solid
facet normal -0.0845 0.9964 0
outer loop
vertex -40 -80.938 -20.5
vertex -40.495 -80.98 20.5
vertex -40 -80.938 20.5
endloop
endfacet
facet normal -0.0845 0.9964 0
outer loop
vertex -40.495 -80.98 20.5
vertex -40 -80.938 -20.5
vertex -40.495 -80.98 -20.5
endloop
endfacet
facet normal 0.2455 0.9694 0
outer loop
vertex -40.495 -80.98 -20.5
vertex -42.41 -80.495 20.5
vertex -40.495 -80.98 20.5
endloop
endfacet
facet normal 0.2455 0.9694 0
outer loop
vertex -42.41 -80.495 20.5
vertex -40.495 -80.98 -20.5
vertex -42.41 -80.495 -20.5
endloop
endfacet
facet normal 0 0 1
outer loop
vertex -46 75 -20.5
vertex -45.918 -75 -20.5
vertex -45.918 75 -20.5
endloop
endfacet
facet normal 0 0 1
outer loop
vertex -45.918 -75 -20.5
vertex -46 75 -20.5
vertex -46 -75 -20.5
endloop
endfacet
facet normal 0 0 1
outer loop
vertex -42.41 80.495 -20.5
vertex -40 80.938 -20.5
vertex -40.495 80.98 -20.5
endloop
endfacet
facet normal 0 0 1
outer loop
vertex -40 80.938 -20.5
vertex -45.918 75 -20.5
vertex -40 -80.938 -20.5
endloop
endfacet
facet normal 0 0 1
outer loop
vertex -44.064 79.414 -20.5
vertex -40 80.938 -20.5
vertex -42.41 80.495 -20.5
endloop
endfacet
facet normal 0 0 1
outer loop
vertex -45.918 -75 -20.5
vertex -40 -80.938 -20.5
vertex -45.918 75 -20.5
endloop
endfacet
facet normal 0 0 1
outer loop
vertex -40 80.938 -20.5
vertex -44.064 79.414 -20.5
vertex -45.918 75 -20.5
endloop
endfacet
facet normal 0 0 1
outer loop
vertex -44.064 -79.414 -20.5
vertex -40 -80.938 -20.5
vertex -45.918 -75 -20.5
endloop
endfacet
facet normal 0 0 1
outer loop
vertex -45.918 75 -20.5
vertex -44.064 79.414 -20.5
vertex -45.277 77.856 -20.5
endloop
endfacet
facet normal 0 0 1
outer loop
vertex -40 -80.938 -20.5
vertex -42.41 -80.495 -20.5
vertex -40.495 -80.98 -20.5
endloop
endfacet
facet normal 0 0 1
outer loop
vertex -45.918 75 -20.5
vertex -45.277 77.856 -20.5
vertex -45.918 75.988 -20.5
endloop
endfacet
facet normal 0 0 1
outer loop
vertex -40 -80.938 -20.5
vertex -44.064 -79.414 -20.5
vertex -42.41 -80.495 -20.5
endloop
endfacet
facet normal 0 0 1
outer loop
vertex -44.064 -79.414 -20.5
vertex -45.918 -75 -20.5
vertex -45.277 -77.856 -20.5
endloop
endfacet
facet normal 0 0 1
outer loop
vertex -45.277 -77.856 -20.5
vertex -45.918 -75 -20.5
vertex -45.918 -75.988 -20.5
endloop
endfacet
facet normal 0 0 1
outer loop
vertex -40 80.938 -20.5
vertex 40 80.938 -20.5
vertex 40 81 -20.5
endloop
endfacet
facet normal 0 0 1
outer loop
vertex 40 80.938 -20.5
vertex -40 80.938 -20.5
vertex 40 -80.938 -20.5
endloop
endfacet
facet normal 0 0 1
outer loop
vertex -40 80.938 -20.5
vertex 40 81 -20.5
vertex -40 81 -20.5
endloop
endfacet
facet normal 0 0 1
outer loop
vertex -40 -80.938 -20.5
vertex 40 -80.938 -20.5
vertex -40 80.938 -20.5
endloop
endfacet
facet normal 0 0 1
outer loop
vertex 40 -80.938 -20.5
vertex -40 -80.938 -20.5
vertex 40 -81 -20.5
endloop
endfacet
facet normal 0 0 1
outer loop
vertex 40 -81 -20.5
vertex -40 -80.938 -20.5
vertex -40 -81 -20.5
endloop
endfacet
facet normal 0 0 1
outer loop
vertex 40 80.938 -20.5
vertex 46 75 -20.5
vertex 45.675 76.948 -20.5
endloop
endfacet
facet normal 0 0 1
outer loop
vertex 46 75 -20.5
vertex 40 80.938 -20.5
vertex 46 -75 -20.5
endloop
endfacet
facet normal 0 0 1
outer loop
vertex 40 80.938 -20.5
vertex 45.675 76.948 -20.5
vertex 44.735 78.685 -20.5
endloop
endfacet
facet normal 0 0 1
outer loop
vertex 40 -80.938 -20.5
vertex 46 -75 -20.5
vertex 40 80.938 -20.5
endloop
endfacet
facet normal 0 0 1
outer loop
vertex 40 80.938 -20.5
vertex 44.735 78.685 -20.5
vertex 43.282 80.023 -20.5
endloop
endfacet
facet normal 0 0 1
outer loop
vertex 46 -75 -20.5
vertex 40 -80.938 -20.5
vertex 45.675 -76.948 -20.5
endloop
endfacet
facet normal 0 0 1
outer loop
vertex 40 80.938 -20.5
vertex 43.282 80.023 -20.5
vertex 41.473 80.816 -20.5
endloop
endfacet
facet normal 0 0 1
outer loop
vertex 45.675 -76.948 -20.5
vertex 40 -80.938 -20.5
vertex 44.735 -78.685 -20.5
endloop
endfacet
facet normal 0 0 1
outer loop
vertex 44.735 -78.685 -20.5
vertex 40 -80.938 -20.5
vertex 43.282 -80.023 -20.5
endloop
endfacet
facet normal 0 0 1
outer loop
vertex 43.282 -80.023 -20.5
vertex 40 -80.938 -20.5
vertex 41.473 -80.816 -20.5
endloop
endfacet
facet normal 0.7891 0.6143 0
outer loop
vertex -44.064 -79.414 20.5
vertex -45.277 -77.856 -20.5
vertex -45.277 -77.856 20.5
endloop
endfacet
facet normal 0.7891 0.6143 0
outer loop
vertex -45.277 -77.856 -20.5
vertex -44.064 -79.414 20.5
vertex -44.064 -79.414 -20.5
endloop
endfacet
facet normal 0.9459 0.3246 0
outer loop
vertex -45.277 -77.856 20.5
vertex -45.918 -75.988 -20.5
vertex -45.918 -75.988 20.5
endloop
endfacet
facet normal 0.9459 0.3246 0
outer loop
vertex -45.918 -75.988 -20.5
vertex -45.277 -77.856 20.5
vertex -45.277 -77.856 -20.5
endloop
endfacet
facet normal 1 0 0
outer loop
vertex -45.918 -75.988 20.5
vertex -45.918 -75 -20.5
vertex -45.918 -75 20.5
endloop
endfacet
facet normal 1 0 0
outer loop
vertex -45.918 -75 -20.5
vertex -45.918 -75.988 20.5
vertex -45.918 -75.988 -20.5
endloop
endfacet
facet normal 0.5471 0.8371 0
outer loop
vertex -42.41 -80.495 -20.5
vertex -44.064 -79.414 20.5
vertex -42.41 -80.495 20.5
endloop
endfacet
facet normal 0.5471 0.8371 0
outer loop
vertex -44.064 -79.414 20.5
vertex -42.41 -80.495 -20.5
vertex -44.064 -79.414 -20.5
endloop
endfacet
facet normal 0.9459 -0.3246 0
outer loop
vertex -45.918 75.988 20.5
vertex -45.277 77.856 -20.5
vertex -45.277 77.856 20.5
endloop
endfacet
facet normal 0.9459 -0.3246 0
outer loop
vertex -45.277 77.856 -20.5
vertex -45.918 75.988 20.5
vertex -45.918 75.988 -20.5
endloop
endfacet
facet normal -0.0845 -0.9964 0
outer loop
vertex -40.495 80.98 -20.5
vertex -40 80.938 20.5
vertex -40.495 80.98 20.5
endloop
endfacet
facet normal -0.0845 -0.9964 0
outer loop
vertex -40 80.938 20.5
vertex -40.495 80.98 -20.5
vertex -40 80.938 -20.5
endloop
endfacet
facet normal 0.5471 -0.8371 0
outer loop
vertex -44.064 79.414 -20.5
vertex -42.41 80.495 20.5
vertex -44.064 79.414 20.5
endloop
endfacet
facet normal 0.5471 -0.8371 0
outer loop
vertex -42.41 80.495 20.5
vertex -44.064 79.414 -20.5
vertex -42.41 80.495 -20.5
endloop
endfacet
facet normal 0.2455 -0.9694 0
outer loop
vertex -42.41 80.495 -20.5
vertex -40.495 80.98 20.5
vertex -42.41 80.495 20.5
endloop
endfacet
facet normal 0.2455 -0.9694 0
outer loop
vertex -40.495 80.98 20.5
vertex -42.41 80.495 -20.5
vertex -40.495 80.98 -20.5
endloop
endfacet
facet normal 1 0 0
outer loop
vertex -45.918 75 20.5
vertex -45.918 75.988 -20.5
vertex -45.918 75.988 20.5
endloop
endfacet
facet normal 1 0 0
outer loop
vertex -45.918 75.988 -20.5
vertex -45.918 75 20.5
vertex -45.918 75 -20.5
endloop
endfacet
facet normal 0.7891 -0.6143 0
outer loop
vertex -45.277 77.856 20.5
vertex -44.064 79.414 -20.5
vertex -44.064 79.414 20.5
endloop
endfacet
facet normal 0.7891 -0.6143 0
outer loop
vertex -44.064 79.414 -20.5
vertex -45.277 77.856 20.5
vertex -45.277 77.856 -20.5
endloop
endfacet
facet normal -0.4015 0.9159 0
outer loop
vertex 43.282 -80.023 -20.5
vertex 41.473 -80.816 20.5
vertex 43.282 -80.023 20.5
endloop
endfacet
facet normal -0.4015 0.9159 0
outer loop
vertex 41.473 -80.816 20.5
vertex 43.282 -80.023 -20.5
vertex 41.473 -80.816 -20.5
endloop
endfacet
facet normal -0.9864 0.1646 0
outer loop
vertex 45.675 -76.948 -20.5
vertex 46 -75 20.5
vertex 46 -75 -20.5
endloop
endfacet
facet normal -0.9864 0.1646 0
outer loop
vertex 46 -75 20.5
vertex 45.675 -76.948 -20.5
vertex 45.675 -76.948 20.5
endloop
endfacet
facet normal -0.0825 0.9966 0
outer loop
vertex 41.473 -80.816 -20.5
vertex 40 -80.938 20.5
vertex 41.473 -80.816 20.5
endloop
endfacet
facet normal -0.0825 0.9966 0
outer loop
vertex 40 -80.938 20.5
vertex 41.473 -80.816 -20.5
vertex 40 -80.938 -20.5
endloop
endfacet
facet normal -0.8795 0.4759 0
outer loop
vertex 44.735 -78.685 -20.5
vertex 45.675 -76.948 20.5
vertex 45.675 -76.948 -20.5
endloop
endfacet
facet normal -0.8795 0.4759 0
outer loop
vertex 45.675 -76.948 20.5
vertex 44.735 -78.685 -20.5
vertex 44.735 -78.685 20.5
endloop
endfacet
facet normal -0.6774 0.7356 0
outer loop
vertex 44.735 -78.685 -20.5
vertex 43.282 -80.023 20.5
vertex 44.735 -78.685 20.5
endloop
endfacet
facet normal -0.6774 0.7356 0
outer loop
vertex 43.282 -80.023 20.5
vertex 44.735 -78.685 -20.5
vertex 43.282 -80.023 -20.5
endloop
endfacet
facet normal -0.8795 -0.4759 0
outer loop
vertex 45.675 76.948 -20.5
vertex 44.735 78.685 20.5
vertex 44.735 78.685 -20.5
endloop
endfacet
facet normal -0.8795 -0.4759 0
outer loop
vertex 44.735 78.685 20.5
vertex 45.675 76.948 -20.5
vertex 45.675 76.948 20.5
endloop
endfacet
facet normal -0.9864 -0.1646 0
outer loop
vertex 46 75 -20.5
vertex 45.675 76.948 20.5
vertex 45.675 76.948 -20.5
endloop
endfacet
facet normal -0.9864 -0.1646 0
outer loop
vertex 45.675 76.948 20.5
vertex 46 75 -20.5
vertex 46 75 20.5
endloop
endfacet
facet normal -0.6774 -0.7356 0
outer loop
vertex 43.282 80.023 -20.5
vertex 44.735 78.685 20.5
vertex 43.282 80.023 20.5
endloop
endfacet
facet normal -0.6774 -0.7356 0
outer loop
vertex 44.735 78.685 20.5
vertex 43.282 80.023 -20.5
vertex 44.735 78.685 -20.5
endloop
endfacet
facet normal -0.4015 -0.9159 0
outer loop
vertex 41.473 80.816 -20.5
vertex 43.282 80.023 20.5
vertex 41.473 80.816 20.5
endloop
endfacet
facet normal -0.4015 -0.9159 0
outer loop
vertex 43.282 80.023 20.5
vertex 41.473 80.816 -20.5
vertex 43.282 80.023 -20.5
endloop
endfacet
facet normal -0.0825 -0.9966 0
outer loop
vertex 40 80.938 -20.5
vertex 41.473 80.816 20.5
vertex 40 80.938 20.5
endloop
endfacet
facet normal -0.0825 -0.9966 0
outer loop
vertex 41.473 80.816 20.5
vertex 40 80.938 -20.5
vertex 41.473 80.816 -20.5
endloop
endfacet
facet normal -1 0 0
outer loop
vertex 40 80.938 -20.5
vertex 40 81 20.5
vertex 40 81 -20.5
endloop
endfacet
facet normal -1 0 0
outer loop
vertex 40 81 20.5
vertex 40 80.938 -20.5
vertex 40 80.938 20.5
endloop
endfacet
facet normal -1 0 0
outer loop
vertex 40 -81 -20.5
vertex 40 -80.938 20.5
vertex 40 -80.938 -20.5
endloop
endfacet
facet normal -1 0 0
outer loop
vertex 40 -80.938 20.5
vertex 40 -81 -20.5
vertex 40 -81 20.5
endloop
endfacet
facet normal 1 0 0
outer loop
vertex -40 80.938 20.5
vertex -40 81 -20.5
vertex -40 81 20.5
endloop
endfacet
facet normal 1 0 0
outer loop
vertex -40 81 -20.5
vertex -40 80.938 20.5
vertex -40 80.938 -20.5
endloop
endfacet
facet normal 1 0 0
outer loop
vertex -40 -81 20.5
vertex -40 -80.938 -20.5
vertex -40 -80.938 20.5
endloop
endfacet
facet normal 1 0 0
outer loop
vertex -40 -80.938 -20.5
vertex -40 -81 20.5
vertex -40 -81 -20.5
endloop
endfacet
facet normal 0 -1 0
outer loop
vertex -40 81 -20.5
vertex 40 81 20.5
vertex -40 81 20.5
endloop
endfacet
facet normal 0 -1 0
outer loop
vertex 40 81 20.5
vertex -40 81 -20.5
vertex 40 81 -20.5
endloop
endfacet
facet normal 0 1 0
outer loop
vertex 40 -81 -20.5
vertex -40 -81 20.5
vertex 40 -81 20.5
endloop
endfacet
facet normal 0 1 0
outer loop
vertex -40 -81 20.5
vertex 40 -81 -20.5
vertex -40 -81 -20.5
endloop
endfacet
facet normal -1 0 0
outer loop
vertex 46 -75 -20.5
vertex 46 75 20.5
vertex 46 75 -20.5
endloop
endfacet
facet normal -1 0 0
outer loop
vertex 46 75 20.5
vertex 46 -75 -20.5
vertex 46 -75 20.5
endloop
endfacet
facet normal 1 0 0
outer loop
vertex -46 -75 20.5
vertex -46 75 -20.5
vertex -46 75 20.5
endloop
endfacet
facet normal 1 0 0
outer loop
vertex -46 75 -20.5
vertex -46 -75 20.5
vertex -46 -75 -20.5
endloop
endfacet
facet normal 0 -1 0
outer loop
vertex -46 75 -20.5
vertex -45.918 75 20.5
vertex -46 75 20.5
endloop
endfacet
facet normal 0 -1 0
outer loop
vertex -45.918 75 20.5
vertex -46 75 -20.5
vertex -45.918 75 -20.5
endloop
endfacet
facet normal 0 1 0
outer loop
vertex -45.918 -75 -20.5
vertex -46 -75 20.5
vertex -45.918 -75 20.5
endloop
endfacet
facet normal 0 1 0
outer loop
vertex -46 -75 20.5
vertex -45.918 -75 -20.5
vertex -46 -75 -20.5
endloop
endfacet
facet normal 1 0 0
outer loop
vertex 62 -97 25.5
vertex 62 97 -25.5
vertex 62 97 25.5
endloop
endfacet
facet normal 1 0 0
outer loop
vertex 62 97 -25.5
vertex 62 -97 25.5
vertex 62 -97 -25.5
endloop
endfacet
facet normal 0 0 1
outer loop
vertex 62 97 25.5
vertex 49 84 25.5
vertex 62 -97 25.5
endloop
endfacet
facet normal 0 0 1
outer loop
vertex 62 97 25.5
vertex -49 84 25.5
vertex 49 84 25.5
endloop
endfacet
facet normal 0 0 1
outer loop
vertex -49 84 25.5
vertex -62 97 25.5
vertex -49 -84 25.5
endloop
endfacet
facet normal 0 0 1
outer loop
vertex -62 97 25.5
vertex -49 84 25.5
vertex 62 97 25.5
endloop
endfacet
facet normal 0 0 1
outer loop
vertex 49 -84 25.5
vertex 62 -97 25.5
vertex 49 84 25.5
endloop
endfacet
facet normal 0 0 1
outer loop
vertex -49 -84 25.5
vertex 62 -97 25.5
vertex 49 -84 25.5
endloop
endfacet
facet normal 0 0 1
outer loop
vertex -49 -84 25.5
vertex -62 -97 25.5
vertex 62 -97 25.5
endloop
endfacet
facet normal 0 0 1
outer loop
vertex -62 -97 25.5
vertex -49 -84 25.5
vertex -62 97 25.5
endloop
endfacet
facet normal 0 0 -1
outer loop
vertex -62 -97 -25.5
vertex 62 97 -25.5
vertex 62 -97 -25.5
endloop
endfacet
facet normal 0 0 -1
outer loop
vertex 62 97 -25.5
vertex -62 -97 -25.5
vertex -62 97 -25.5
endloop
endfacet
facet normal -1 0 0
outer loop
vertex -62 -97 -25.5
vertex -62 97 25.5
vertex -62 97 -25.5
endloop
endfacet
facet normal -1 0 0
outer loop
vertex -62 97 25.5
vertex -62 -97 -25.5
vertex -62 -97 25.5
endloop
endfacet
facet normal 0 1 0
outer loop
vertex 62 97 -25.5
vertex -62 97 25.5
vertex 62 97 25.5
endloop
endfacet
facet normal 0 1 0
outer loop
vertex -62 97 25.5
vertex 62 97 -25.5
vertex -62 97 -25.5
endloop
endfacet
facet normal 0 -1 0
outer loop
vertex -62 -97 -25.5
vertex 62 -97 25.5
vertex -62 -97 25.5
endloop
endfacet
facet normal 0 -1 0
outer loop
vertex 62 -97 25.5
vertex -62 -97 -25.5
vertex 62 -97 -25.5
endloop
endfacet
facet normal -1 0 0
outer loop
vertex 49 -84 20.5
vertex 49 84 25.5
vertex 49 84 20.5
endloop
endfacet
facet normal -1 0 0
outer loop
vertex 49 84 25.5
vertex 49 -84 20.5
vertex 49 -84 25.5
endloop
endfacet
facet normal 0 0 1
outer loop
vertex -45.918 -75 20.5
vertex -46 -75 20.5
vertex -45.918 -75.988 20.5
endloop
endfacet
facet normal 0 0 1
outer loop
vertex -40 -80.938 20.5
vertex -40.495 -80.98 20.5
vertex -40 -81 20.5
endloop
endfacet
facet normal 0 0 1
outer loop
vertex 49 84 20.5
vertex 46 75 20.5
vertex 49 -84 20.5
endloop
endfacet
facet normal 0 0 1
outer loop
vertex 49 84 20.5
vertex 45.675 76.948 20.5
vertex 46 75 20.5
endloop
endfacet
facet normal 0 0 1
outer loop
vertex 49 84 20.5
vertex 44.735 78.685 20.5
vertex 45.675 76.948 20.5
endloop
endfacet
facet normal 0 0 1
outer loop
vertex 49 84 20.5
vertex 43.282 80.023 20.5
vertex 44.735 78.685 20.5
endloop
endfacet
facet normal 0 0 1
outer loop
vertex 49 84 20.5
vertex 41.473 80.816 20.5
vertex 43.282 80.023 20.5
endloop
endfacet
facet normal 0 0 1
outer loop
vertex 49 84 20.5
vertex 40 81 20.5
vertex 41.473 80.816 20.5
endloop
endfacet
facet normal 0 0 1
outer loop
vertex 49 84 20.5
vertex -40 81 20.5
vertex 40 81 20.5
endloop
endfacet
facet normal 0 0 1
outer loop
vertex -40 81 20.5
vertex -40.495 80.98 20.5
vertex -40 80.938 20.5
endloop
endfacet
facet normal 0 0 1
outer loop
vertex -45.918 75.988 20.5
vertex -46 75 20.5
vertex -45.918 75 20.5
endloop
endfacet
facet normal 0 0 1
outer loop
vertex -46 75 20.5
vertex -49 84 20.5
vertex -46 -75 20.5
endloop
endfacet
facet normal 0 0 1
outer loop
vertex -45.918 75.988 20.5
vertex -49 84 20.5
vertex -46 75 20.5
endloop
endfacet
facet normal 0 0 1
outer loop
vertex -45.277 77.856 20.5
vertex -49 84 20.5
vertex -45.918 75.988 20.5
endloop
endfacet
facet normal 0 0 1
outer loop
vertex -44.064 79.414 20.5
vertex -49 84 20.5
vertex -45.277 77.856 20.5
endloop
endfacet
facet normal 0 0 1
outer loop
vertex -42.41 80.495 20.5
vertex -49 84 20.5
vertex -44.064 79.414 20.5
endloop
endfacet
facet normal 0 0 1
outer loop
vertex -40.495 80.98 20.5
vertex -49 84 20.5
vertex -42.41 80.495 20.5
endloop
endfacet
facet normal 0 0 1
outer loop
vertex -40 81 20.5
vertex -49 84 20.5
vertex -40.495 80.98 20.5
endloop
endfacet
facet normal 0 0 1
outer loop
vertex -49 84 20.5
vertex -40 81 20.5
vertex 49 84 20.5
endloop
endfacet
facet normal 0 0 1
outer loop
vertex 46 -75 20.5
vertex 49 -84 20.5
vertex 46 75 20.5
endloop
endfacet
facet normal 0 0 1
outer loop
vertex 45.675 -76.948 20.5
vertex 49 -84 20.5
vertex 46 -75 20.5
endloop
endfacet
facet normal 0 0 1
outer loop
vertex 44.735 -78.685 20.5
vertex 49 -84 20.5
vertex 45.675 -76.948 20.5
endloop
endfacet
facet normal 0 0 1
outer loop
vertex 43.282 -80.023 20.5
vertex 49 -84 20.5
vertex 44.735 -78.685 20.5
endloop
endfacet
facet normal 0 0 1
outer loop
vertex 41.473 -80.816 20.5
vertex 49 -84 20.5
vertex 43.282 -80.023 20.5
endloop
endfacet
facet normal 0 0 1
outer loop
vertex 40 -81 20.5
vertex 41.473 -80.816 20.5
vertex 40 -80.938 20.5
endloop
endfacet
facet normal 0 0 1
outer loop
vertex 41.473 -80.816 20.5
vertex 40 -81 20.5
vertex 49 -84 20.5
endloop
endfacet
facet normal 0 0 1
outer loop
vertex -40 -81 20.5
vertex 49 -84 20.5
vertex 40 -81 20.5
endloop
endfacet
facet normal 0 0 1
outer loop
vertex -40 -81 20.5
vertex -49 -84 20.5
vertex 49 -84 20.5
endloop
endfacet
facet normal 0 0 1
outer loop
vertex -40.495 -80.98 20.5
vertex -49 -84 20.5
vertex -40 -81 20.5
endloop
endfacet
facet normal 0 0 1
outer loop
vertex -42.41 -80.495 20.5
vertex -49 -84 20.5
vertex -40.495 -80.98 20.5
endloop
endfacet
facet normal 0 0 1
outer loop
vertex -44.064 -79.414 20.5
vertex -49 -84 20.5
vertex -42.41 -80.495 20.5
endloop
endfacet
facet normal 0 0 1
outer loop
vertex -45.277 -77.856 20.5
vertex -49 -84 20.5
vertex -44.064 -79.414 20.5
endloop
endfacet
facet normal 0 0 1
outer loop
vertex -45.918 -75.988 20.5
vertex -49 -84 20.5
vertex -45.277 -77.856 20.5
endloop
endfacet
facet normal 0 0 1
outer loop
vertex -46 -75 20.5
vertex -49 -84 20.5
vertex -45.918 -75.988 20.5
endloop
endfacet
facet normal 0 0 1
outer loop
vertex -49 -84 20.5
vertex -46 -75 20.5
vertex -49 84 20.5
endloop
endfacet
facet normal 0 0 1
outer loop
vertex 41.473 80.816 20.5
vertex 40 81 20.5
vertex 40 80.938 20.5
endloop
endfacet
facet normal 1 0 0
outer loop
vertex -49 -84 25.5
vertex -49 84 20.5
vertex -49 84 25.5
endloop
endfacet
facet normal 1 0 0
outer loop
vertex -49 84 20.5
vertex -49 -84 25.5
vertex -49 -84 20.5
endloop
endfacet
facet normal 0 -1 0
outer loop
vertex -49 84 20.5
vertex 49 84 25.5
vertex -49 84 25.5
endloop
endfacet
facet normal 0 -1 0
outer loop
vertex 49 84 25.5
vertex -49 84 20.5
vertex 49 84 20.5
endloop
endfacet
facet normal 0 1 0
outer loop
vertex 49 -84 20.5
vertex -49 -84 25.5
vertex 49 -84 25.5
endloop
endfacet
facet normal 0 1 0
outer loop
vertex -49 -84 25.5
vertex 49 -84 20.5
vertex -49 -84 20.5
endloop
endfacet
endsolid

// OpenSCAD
include <MCAD/shapes.scad>

// Height of drip tray
height_text_box=51;
// Tray depth
tray_width_text_box=98;
// Tray length
tray_length_text_box=168;
// Tray bottom thickness
bottom_thickness_slider=5; // [0:20]
// Tray insert height
tray_height_slider=5; // [0:10]
// Tray insert lip
tray_lip_slider=6; // [0:20]

height = height_text_box;
tray_width = tray_width_text_box;
tray_length = tray_length_text_box;
bottom_thickness = bottom_thickness_slider;
tray_height = tray_height_slider;
tray_lip = tray_lip_slider;

difference() {
	cube([124, 194, height], center=true);
	translate([0,0,bottom_thickness]) roundedBox(tray_width-tray_lip, tray_length-tray_lip, height, tray_lip);
	translate([0,0,height-tray_height]) cube([tray_width, tray_length, height], center=true);
}
